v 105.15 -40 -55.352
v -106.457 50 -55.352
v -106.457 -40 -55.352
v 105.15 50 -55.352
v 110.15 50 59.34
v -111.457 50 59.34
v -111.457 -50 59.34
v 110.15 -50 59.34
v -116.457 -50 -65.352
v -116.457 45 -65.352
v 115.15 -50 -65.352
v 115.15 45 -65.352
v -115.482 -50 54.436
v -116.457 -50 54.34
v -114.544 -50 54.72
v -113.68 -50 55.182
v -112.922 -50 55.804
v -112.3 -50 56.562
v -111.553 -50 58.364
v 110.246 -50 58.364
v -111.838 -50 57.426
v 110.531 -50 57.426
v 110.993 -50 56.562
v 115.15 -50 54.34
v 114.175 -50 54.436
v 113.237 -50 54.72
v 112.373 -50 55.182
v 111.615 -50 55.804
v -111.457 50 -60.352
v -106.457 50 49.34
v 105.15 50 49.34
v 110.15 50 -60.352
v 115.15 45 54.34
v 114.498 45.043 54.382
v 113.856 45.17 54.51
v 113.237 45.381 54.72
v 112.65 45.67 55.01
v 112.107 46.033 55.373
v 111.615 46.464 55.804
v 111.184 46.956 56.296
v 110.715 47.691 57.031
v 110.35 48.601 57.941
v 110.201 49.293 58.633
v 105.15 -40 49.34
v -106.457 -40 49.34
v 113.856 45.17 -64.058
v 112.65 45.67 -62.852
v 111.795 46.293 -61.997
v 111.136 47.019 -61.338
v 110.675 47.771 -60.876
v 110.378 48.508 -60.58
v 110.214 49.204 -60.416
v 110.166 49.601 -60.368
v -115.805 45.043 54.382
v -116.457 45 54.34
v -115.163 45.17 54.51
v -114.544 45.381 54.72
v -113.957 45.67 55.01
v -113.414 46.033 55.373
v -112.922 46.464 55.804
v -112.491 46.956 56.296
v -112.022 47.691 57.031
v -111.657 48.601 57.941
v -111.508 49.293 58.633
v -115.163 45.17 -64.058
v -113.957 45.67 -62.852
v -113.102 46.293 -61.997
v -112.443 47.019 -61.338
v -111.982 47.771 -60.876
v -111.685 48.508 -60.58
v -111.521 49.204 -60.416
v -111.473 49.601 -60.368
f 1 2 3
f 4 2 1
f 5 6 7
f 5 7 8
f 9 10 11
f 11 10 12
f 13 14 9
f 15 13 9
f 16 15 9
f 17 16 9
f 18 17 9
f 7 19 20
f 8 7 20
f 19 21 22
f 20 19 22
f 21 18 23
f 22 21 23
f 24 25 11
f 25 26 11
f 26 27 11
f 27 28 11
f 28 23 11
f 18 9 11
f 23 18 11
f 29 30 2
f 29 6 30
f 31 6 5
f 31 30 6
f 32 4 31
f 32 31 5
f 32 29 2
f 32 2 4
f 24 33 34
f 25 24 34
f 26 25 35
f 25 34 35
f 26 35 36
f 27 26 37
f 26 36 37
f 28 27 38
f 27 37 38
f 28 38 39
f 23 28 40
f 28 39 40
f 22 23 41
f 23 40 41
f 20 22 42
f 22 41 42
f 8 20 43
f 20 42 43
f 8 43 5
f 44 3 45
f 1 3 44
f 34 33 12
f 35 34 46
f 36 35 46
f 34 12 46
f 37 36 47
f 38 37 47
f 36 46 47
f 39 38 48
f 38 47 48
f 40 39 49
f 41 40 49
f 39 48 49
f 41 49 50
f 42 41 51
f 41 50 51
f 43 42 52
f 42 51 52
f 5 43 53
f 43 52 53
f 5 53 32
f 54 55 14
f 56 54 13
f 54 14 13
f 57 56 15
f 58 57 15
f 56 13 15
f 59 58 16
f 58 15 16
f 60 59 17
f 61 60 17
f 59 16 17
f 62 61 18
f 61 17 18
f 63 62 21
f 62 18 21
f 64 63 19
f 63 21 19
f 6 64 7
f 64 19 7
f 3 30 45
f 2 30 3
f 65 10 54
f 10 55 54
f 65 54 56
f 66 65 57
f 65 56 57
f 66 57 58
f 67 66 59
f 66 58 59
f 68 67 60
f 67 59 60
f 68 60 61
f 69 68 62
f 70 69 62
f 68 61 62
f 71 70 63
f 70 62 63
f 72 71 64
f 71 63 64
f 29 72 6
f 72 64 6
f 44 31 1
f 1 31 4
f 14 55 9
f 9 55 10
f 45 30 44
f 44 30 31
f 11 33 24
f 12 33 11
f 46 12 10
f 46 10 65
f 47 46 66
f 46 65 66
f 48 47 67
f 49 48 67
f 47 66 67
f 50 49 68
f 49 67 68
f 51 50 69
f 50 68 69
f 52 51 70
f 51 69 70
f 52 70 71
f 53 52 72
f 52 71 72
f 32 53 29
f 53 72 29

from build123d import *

# Parameters (mm, degrees)
SKETCH_1_W        = 231.607772504
SKETCH_1_H        = 124.691769169
EXTRUDE_1_DEPTH   = 50
SHELL_1_T         = -10
SWEEP_1_PROFILE_R = 5


with BuildPart() as part:
    # 草图1 → 凸台-拉伸1 (new, symmetric)
    with BuildSketch(Plane(origin=(0, 0, 0), x_dir=(1, 0, 0), z_dir=(0, 1, 0))):
        with Locations((-0.653520803, 3.006195692)):
            Rectangle(SKETCH_1_W, SKETCH_1_H)
    extrude(amount=EXTRUDE_1_DEPTH, both=True)

    # 抽壳1
    shell_1_openings = [part.faces().sort_by_distance(p)[0] for p in [
        (-0.653520803, 50, -3.006195693),
    ]]
    offset(amount=SHELL_1_T, openings=shell_1_openings, kind=Kind.INTERSECTION)

    # 切除-扫描1: sweep along a curve in space
    with BuildLine() as sweep_1_path:
        Line((115.150365449, -50, 59.339688892), (115.150365449, 50, 59.339688892))
        Line((115.150365449, 50, 59.339688892), (115.150365449, 50, -65.352080277))
        Line((115.150365449, 50, -65.352080277), (-116.457407055, 50, -65.352080277))
        Line((-116.457407055, 50, -65.352080277), (-116.457407055, 50, 59.339688892))
        Line((-116.457407055, 50, 59.339688892), (-116.457407055, -50, 59.339688892))
    # 切除-扫描1 profile (on start of the path) → 切除-扫描1 (sweep, cut)
    with BuildSketch(Plane(origin=(115.150365449, -50, 59.339688892), x_dir=(0, 0, 1), z_dir=(0, 1, 0))):
        Circle(SWEEP_1_PROFILE_R)
    sweep(path=sweep_1_path.line, transition=Transition.RIGHT, mode=Mode.SUBTRACT)


solid = part.part
